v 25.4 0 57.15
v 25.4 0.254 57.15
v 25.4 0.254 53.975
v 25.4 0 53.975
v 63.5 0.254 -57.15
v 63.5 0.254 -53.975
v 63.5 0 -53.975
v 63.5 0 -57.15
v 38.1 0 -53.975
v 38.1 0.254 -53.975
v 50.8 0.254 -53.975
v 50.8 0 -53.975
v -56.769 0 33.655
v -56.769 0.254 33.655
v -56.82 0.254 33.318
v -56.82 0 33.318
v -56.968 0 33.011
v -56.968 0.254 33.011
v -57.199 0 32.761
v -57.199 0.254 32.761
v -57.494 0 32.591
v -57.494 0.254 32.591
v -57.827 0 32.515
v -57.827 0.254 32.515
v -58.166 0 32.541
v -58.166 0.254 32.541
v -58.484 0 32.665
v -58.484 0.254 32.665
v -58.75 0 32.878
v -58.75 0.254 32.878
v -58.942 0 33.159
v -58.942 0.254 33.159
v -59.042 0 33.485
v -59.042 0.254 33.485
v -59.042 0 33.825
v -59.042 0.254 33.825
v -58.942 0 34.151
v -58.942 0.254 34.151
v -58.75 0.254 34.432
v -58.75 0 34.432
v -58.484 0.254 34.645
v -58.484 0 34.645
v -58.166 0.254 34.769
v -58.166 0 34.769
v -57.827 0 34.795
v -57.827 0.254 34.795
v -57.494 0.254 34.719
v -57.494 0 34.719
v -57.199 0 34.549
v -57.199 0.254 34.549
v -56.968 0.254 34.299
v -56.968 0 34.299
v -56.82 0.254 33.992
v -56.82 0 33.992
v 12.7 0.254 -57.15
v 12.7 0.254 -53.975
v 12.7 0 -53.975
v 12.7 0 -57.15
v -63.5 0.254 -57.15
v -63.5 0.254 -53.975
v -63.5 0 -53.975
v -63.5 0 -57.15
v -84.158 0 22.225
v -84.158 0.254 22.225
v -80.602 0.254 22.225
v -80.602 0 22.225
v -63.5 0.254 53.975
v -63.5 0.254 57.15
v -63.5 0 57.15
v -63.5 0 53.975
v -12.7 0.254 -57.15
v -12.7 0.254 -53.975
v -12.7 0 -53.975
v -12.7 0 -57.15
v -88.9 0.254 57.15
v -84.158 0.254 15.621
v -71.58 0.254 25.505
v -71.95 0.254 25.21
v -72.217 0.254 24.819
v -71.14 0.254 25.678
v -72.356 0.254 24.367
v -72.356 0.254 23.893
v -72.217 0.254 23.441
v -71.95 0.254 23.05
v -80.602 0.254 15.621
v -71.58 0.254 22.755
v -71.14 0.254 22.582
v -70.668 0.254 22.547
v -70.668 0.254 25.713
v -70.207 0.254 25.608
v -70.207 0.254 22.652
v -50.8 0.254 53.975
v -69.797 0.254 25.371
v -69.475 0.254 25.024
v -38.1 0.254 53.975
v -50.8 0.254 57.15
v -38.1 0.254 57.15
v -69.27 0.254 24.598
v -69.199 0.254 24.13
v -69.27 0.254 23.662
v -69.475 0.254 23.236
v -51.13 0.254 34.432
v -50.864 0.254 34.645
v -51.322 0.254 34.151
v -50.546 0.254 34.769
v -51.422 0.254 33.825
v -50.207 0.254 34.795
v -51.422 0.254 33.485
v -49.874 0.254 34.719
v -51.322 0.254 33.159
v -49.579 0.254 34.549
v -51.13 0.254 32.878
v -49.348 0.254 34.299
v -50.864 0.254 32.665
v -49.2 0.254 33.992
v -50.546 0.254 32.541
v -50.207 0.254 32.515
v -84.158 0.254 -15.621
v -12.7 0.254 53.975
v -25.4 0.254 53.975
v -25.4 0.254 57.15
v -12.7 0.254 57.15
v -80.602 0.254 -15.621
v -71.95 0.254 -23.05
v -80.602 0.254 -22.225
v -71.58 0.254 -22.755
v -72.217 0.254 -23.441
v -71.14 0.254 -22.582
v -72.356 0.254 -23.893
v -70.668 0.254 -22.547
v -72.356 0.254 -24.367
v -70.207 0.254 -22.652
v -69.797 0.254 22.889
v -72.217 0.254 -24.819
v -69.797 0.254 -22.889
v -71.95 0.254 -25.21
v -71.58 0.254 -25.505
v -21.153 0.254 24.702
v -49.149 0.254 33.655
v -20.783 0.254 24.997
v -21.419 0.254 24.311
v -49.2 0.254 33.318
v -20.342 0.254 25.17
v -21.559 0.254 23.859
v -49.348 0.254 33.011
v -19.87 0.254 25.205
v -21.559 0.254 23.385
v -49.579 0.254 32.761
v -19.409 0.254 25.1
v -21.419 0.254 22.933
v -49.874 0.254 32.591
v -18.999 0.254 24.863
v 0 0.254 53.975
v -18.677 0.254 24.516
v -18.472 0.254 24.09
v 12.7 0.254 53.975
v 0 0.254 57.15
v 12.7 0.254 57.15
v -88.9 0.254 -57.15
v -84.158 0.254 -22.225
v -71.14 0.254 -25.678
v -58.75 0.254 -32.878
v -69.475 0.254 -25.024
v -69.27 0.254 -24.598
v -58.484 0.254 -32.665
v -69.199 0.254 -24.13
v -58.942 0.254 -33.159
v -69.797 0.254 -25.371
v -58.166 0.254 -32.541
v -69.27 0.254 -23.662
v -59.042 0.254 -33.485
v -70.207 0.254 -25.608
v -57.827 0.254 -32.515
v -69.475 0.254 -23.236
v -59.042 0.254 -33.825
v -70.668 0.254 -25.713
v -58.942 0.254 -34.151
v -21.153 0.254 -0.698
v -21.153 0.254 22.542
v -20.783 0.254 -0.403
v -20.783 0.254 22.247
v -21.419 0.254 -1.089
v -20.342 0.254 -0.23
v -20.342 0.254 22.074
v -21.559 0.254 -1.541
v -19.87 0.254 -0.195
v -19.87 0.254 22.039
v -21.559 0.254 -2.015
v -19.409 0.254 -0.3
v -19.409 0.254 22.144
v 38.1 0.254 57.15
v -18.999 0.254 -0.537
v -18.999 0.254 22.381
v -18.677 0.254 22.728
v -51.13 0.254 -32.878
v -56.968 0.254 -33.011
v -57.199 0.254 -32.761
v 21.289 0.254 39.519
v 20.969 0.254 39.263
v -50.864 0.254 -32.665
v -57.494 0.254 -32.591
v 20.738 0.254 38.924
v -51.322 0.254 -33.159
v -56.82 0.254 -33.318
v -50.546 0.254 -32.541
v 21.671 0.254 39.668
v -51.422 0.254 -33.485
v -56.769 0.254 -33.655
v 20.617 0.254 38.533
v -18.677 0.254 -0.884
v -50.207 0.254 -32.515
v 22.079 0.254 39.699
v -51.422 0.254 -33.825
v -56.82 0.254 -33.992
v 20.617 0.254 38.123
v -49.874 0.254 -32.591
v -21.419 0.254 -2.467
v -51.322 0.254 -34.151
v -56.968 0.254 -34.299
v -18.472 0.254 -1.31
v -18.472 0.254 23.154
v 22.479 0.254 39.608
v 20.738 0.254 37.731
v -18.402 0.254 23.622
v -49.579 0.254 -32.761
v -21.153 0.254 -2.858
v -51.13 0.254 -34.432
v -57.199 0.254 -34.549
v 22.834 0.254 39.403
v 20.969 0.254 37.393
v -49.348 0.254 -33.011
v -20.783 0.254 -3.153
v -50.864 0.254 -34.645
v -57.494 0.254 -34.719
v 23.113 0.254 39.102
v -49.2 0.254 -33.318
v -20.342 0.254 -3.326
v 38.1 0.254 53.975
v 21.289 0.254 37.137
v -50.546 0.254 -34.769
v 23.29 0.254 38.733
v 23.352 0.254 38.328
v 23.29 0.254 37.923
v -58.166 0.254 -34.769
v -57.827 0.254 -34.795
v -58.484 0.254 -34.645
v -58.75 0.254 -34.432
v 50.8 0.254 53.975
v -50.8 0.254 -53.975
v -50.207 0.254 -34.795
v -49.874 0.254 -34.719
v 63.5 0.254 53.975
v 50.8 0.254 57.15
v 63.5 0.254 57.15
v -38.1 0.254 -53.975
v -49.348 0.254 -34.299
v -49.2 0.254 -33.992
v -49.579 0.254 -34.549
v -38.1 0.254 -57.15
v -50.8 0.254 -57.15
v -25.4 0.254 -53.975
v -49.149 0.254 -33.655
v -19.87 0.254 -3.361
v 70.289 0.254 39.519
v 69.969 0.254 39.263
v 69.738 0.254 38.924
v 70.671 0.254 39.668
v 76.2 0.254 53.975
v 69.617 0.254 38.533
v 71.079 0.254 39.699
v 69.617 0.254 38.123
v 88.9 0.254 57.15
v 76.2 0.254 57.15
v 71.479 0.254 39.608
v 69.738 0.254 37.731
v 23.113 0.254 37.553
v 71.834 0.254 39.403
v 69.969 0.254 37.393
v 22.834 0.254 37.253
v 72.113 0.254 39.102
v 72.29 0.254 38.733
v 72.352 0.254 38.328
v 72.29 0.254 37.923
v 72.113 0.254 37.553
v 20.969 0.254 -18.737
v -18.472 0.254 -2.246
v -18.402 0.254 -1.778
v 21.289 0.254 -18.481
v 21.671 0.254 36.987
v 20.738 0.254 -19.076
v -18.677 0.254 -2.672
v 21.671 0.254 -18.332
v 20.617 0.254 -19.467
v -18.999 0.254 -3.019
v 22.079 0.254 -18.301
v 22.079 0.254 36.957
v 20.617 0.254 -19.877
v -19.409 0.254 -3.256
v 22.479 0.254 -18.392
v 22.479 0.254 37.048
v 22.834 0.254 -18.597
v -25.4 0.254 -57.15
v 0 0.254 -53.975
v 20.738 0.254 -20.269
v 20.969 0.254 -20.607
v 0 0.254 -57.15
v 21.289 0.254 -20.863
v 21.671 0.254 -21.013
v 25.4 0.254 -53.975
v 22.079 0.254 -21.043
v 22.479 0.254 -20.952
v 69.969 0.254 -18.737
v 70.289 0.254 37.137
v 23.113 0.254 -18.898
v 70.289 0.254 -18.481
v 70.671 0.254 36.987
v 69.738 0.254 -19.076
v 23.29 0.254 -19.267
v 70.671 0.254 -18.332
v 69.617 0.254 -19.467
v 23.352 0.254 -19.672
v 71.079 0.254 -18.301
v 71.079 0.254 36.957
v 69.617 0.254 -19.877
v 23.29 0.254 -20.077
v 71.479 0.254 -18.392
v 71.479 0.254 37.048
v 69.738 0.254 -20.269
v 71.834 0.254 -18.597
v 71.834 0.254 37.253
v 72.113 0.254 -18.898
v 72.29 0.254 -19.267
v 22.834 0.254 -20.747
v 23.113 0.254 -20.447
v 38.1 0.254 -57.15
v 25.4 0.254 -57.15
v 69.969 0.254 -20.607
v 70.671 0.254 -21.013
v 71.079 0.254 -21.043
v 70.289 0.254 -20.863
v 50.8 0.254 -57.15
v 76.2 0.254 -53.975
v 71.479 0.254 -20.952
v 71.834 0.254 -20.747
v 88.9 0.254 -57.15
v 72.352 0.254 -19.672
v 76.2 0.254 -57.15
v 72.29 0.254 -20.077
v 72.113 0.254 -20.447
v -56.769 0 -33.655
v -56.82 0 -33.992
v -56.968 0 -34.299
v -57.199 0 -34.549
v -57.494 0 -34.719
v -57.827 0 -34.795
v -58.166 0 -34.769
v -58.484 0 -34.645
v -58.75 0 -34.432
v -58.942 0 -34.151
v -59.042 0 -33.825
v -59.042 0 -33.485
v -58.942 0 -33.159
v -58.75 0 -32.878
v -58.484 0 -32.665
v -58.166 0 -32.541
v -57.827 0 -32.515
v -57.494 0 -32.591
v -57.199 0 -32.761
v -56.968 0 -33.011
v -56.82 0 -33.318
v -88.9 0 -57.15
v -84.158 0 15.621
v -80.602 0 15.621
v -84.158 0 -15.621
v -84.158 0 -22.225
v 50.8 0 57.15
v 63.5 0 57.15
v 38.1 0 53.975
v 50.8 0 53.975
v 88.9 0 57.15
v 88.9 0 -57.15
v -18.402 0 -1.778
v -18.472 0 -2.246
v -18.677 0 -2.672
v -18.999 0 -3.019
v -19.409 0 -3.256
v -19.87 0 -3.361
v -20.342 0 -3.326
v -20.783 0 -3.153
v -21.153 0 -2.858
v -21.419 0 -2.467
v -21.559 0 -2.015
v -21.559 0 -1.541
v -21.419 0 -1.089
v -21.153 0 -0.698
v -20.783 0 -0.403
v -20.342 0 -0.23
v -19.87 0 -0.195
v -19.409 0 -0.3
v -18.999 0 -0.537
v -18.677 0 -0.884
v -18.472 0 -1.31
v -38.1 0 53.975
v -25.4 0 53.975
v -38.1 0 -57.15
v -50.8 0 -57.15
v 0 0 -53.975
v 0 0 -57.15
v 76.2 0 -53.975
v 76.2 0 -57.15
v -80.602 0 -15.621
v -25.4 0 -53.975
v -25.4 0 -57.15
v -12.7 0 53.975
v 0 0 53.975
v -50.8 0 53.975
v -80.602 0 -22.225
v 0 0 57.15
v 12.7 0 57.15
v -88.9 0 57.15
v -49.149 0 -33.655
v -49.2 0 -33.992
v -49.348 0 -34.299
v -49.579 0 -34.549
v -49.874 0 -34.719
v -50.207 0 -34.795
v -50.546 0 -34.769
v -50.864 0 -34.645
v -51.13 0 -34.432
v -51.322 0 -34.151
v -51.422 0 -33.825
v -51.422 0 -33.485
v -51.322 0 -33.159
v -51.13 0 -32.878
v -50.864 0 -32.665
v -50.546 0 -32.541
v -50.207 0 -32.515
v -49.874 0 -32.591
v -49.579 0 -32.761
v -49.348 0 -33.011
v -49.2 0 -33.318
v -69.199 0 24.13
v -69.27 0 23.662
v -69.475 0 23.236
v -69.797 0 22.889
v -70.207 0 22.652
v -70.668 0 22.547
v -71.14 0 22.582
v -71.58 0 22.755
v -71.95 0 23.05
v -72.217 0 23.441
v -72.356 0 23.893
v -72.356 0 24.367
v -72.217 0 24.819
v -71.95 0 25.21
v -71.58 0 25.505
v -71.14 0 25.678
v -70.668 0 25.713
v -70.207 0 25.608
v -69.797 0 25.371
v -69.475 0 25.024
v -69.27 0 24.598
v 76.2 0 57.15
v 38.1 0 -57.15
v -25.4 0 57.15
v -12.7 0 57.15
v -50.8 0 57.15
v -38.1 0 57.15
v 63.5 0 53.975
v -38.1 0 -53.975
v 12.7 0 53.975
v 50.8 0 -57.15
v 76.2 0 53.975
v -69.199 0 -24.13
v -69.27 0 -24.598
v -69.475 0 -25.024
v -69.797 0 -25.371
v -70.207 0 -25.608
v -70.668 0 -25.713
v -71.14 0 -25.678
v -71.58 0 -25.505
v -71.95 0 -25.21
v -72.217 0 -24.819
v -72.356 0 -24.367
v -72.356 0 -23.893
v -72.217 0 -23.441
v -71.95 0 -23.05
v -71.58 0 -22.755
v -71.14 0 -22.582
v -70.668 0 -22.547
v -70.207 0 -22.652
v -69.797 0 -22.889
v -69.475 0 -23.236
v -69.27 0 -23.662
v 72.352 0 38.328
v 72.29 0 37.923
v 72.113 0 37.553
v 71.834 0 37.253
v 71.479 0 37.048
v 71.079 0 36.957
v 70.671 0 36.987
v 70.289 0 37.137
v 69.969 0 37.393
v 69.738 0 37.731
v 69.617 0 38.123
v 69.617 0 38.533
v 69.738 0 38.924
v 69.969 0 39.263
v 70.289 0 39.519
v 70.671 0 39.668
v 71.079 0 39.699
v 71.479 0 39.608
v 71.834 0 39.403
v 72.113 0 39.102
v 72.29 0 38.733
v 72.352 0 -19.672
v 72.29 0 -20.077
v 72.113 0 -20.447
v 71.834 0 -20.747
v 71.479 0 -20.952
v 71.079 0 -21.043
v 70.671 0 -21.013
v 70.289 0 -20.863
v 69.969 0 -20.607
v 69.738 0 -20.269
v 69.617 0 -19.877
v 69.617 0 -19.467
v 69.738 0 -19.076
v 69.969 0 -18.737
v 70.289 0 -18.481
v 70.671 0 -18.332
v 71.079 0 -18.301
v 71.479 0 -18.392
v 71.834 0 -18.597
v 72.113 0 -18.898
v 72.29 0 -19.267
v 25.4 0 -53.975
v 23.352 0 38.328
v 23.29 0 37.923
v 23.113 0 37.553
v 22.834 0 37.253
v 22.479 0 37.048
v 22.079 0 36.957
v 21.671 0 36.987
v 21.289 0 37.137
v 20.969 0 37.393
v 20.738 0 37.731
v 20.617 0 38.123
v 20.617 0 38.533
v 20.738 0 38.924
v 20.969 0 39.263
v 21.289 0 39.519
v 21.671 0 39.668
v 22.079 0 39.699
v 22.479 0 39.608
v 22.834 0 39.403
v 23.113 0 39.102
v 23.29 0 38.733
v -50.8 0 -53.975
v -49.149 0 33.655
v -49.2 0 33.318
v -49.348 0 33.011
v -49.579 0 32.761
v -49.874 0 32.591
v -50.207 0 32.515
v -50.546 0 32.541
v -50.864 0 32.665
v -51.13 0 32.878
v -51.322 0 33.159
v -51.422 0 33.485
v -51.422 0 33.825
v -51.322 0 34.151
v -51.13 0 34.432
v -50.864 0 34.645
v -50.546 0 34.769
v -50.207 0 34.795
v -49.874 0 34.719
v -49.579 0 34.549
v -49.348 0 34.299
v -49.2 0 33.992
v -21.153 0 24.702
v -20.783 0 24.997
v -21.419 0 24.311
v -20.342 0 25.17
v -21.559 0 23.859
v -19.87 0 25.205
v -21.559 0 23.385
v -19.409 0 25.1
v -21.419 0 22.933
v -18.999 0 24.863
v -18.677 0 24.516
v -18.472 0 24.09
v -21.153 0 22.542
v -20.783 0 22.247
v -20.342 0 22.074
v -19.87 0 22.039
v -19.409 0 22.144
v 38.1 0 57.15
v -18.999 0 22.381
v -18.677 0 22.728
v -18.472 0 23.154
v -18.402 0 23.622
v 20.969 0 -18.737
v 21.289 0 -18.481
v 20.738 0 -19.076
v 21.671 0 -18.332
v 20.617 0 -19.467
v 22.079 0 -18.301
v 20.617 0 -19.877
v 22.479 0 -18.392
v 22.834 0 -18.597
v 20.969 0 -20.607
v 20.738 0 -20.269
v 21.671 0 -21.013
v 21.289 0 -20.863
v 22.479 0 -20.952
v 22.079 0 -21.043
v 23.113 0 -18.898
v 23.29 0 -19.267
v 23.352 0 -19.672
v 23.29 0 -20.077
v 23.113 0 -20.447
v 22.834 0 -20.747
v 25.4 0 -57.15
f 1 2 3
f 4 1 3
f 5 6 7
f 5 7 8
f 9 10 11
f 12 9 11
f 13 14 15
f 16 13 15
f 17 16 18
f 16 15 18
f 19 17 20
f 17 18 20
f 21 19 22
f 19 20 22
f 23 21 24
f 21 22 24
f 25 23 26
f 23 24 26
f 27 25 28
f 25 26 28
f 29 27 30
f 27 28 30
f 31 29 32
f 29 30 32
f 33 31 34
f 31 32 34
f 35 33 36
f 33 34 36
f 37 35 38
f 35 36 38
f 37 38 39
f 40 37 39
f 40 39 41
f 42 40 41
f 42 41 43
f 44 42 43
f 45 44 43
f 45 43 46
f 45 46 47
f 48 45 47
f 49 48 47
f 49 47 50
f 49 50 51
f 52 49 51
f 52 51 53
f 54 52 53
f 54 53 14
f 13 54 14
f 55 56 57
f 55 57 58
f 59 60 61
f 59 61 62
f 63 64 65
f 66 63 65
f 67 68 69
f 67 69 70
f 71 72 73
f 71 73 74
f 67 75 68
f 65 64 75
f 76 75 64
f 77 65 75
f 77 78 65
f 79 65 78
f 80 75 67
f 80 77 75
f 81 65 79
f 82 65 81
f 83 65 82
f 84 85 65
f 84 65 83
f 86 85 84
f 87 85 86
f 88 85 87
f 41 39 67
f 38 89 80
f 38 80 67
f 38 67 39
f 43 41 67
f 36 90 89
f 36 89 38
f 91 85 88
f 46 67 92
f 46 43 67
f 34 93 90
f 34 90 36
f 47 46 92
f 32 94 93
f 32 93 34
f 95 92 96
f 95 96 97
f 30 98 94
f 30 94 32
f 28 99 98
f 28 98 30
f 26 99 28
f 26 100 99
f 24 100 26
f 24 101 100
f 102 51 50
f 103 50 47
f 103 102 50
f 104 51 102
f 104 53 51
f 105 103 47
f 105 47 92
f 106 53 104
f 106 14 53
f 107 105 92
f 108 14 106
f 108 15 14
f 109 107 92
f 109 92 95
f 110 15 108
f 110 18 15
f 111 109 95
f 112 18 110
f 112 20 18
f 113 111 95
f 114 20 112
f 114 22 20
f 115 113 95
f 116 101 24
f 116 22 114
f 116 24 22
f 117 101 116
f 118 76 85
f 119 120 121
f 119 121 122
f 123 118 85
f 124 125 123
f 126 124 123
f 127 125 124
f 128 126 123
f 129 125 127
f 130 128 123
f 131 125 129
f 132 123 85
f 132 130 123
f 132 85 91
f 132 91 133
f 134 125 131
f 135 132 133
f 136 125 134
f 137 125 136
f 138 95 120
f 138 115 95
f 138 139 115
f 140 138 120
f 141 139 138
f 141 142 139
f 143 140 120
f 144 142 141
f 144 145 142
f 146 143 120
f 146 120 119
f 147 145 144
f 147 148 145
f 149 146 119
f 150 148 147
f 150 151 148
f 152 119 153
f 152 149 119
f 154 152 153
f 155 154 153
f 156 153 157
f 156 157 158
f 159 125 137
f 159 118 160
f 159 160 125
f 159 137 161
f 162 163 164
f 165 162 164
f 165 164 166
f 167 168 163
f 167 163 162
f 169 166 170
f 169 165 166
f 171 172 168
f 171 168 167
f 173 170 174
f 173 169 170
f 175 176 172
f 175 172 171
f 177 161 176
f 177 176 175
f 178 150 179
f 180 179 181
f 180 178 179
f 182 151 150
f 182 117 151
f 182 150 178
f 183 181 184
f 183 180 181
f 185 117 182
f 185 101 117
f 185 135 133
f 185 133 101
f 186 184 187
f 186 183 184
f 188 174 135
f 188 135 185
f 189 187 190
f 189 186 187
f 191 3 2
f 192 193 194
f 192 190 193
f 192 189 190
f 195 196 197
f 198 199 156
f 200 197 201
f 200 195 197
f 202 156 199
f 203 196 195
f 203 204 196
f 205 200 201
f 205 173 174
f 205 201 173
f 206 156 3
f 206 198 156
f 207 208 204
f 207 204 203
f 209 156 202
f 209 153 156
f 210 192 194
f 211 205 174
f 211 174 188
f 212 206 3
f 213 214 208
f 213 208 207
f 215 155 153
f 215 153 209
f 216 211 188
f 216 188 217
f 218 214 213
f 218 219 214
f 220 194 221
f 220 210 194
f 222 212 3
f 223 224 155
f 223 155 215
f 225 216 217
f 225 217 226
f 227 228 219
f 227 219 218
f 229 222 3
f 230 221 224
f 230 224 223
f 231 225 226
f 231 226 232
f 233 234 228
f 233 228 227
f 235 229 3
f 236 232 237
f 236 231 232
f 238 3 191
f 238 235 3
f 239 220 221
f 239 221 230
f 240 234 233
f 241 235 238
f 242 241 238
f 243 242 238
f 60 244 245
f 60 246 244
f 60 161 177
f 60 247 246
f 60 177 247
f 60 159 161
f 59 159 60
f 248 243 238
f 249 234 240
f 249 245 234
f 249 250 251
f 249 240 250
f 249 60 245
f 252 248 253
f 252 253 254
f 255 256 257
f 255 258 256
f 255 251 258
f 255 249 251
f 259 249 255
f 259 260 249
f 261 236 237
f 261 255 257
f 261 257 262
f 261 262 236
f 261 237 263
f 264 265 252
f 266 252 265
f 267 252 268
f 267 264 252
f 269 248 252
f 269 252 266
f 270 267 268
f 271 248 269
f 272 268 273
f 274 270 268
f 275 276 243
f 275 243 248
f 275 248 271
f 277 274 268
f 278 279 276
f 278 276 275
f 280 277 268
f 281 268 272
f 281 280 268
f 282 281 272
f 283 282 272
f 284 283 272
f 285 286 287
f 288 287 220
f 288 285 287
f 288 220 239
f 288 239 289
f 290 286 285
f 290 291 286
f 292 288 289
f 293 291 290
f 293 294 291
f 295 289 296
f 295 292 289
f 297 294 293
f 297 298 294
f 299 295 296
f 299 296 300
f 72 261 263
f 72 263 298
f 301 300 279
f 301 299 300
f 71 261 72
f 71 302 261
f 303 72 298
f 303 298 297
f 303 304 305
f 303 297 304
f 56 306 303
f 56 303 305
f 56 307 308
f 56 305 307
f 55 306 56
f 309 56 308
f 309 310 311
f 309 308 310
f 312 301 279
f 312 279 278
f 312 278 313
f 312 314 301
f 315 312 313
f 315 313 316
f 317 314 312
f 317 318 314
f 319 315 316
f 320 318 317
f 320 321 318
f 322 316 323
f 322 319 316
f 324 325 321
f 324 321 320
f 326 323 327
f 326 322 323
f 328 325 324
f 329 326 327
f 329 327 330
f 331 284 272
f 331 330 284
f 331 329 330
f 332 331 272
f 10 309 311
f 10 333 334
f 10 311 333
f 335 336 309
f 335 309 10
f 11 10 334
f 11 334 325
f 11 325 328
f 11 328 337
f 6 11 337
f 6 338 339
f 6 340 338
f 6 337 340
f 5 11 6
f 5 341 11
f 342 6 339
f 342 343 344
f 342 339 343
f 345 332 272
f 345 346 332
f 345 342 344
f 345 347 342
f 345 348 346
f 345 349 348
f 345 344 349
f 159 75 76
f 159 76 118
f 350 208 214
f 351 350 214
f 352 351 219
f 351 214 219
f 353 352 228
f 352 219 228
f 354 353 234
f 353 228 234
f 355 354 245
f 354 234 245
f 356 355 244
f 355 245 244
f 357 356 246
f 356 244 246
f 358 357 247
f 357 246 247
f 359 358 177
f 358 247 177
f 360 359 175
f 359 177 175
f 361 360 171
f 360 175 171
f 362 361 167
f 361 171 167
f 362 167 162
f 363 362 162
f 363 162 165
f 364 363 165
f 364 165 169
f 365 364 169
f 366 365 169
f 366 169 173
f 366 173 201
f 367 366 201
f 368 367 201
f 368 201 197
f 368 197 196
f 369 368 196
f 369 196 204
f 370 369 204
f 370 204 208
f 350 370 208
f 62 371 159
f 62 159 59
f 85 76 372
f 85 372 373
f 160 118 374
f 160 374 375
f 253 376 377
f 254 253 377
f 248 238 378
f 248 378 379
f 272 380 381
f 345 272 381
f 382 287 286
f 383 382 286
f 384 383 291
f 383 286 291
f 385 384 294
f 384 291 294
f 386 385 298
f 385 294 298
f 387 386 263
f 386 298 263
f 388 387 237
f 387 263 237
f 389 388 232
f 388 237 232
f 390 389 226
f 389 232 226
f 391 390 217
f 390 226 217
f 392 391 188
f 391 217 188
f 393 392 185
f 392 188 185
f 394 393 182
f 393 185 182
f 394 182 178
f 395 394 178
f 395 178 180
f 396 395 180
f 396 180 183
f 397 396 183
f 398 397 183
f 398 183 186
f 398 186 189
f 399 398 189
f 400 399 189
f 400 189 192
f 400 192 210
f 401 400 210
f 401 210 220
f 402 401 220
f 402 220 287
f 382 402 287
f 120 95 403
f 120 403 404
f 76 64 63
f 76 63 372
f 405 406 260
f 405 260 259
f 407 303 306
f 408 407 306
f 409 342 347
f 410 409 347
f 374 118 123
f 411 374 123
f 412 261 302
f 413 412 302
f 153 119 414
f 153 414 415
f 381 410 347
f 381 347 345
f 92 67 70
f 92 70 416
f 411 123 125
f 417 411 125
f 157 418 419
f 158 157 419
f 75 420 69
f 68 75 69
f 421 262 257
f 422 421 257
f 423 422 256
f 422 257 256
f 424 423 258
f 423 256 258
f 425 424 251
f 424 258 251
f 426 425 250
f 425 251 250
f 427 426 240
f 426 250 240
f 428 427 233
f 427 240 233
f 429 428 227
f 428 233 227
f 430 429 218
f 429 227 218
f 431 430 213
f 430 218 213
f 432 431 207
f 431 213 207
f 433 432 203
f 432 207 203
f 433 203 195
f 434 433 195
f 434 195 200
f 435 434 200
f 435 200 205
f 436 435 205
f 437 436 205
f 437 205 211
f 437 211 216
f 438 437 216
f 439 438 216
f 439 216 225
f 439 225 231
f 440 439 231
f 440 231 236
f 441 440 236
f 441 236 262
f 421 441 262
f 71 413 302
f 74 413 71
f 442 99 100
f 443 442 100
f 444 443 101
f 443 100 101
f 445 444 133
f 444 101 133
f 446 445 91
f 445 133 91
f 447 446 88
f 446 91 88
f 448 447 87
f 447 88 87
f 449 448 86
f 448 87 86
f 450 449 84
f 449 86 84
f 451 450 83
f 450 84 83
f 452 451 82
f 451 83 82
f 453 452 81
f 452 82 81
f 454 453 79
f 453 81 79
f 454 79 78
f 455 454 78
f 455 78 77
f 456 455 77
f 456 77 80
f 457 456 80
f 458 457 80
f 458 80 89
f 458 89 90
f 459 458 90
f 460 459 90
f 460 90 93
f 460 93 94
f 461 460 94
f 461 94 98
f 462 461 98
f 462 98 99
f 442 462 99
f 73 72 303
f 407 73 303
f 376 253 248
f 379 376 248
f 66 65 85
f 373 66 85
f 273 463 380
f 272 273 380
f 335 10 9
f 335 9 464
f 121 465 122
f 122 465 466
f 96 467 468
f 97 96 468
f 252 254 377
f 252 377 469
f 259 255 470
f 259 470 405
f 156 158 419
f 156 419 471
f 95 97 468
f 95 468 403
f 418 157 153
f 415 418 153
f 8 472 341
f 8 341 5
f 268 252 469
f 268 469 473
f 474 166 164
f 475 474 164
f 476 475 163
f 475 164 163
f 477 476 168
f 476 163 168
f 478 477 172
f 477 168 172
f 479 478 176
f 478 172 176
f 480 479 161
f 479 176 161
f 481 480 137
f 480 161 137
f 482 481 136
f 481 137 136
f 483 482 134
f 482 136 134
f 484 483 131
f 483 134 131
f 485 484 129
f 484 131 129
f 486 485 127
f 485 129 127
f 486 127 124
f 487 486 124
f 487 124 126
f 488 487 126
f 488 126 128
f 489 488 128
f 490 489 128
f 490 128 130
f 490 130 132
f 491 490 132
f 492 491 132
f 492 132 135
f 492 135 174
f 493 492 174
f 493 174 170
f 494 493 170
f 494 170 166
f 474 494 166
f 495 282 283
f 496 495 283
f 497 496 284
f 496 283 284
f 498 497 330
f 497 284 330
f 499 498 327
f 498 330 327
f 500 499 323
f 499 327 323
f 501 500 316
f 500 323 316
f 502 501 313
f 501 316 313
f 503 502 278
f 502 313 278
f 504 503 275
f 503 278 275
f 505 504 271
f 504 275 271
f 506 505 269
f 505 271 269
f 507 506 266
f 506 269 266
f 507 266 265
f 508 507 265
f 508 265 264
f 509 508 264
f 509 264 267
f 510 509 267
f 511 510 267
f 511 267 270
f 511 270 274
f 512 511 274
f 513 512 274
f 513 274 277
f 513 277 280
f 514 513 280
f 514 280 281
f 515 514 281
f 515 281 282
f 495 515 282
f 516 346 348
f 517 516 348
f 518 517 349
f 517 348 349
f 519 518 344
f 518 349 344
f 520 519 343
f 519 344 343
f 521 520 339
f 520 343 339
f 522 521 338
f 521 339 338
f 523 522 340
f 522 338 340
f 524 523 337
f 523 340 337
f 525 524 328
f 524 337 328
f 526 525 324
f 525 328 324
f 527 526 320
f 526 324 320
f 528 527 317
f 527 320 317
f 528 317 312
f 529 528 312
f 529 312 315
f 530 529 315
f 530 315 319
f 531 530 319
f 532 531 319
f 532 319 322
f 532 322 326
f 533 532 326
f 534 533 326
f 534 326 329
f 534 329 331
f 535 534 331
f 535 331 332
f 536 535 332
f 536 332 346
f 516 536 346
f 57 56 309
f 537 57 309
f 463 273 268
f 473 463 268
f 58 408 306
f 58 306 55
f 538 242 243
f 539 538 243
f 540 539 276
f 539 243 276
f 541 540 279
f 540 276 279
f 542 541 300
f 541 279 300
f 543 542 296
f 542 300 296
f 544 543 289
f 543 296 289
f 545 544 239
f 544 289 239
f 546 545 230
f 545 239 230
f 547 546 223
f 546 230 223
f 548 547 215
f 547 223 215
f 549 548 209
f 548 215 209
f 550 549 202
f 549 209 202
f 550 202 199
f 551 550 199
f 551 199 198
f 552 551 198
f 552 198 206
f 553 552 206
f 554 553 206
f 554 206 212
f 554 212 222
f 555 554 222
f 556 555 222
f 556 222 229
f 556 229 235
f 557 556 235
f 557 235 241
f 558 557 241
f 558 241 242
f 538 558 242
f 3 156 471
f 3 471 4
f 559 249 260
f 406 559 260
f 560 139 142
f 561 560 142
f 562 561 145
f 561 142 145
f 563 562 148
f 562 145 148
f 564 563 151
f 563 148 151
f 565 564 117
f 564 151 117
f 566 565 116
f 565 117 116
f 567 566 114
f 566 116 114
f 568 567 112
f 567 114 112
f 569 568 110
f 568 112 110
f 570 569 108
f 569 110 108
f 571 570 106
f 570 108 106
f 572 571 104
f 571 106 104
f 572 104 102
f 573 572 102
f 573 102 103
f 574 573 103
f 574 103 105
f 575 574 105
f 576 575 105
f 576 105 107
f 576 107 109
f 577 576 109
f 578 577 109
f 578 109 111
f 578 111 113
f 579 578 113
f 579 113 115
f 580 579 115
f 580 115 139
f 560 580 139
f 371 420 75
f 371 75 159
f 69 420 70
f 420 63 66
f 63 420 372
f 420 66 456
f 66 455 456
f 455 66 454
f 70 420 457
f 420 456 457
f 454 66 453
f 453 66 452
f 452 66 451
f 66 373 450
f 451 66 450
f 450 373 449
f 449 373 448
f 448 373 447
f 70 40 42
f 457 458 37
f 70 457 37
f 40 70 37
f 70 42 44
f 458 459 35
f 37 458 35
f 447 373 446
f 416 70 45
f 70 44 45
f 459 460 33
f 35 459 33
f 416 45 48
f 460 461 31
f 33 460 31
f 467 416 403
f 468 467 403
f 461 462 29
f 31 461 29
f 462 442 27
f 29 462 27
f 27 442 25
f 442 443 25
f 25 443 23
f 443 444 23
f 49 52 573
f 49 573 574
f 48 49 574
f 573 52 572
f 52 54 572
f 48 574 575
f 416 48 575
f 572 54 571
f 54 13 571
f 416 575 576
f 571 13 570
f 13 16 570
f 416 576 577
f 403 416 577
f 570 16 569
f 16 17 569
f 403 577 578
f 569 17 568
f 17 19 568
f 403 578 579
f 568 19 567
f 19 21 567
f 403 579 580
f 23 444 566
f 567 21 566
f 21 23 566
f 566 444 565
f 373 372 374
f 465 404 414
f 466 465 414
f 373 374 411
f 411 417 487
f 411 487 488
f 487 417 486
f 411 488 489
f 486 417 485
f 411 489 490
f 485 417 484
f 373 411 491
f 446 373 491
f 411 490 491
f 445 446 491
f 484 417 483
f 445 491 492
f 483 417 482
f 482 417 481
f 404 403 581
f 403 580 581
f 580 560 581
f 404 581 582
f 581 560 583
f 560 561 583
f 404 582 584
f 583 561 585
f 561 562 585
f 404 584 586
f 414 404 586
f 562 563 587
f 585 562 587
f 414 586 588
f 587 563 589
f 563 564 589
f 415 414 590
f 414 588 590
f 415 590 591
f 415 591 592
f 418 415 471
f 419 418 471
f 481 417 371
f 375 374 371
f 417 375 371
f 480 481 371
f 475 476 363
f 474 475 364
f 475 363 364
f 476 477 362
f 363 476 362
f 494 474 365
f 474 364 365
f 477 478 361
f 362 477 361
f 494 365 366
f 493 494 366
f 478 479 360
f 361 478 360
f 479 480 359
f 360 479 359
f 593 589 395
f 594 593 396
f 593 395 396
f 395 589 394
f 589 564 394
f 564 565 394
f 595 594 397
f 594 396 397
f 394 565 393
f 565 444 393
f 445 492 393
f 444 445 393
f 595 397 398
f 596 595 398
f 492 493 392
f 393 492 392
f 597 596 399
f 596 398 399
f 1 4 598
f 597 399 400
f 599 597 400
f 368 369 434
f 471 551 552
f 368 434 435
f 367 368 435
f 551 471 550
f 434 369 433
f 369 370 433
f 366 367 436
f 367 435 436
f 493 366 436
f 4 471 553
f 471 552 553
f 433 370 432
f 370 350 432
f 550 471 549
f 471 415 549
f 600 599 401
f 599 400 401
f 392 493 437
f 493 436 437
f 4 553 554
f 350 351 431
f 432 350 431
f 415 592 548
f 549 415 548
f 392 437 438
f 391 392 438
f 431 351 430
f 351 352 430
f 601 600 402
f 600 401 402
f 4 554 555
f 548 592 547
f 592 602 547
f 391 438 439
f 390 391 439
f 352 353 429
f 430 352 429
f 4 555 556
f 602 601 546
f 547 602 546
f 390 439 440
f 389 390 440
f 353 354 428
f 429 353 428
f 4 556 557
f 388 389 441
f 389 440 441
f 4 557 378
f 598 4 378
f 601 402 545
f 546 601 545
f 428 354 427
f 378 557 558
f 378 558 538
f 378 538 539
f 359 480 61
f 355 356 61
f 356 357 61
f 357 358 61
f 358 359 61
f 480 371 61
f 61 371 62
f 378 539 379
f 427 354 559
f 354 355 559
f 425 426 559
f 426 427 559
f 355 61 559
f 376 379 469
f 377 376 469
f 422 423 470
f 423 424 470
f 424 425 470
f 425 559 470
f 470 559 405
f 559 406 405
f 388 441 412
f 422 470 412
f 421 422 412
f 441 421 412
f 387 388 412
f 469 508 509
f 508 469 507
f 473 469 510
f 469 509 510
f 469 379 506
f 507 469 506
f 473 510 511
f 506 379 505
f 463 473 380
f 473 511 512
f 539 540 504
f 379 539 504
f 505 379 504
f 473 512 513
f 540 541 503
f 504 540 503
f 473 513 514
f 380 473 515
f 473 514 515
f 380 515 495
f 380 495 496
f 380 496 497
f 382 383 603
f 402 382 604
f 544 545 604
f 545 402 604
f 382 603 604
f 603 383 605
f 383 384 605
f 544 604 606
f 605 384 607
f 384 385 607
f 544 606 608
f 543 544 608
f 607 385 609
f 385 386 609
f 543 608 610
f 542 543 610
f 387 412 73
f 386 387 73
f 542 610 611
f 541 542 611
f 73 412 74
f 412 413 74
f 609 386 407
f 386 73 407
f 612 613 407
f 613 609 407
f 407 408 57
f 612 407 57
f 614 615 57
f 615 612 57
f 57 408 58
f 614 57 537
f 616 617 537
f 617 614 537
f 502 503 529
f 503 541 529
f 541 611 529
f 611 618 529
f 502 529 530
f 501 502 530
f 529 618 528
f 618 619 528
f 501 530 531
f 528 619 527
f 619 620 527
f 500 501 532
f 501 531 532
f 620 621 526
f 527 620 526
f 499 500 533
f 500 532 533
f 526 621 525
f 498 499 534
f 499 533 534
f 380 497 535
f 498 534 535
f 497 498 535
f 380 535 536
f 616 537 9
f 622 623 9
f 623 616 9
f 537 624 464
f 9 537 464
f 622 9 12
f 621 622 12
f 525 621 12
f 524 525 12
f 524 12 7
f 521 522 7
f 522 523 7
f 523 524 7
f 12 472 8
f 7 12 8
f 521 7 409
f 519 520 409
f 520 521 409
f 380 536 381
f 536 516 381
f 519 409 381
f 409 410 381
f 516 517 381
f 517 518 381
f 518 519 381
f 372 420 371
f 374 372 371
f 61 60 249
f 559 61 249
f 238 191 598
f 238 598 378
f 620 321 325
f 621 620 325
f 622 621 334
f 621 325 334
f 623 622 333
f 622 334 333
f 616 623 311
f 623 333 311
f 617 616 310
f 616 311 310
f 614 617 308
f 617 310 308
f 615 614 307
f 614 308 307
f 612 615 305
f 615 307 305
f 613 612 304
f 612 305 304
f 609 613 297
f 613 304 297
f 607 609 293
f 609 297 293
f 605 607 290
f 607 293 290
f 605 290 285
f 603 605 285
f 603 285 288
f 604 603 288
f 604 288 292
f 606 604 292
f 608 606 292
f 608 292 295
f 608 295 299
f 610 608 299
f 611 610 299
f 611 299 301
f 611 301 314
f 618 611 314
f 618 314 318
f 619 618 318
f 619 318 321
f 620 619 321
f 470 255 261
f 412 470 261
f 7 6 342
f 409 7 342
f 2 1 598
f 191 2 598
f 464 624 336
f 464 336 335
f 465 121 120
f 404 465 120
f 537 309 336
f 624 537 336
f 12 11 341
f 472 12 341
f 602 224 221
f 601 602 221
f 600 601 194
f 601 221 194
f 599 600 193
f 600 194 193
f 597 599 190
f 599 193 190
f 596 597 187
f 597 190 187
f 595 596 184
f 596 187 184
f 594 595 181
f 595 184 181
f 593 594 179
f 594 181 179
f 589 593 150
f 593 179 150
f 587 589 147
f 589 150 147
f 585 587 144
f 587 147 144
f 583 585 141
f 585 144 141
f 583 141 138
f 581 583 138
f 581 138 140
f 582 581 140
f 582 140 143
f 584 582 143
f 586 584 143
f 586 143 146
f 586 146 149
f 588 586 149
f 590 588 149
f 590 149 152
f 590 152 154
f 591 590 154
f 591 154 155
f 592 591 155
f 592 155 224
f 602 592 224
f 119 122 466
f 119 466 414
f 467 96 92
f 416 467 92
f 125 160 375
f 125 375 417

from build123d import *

# Parameters (mm, degrees)
SKETCH1_W           = 177.8
SKETCH1_H           = 114.3
BOSS_EXTRUDE1_DEPTH = 0.254
SKETCH2_R           = 1.143
SKETCH2_W           = 12.7
SKETCH2_H           = 3.175
CUT_EXTRUDE1_DEPTH  = 1.254
SKETCH3_R           = 1.375
SKETCH3_R_2         = 1.5875
SKETCH3_W           = 3.556
SKETCH3_H           = 6.604
CUT_EXTRUDE2_DEPTH  = 1.254


with BuildPart() as part:
    # Sketch1 → Boss-Extrude1 (new body)
    with BuildSketch(Plane(origin=(0, 0, 0), x_dir=(1, 0, 0), z_dir=(0, 1, 0))):
        Rectangle(SKETCH1_W, SKETCH1_H)
    extrude(amount=BOSS_EXTRUDE1_DEPTH)

    # Sketch2 → Cut-Extrude1 (cut, through all)
    with BuildSketch(Plane(origin=(0, 0.254, 0), x_dir=(1, 0, 0), z_dir=(0, 1, 0))):
        with Locations((-57.912, -33.655)):
            Circle(SKETCH2_R)
        with Locations((-50.292, -33.655)):
            Circle(SKETCH2_R)
        with Locations((-50.292, 33.655)):
            Circle(SKETCH2_R)
        with Locations((-57.912, 33.655)):
            Circle(SKETCH2_R)
        with Locations((69.85, -55.5625)):
            Rectangle(SKETCH2_W, SKETCH2_H)
        with Locations((44.45, -55.5625)):
            Rectangle(SKETCH2_W, SKETCH2_H)
        with Locations((19.05, -55.5625)):
            Rectangle(SKETCH2_W, SKETCH2_H)
        with Locations((-6.35, -55.5625)):
            Rectangle(SKETCH2_W, SKETCH2_H)
        with Locations((-31.75, -55.5625)):
            Rectangle(SKETCH2_W, SKETCH2_H)
        with Locations((-57.15, -55.5625)):
            Rectangle(SKETCH2_W, SKETCH2_H)
        with Locations((69.85, 55.5625)):
            Rectangle(SKETCH2_W, SKETCH2_H)
        with Locations((44.45, 55.5625)):
            Rectangle(SKETCH2_W, SKETCH2_H)
        with Locations((19.05, 55.5625)):
            Rectangle(SKETCH2_W, SKETCH2_H)
        with Locations((-6.35, 55.5625)):
            Rectangle(SKETCH2_W, SKETCH2_H)
        with Locations((-31.75, 55.5625)):
            Rectangle(SKETCH2_W, SKETCH2_H)
        with Locations((-57.15, 55.5625)):
            Rectangle(SKETCH2_W, SKETCH2_H)
    extrude(amount=-CUT_EXTRUDE1_DEPTH, mode=Mode.SUBTRACT)

    # Sketch3 → Cut-Extrude2 (cut, through all)
    with BuildSketch(Plane(origin=(0, 0.254, 0), x_dir=(1, 0, 0), z_dir=(0, 1, 0))):
        with Locations((70.976500958, -38.327807122)):
            Circle(SKETCH3_R)
        with Locations((21.976500958, -38.327807122)):
            Circle(SKETCH3_R)
        with Locations((21.976500958, 19.672192878)):
            Circle(SKETCH3_R)
        with Locations((70.976500958, 19.672192878)):
            Circle(SKETCH3_R)
        with Locations((-70.786531145, -24.13)):
            Circle(SKETCH3_R_2)
        with Locations((-70.786531145, 24.13)):
            Circle(SKETCH3_R_2)
        with Locations((-19.989071209, -23.622)):
            Circle(SKETCH3_R_2)
        with Locations((-19.989071209, 1.778)):
            Circle(SKETCH3_R_2)
        with Locations((-82.380316409, 18.923)):
            Rectangle(SKETCH3_W, SKETCH3_H)
        with Locations((-82.380316409, -18.923)):
            Rectangle(SKETCH3_W, SKETCH3_H)
    extrude(amount=-CUT_EXTRUDE2_DEPTH, mode=Mode.SUBTRACT)


solid = part.part
